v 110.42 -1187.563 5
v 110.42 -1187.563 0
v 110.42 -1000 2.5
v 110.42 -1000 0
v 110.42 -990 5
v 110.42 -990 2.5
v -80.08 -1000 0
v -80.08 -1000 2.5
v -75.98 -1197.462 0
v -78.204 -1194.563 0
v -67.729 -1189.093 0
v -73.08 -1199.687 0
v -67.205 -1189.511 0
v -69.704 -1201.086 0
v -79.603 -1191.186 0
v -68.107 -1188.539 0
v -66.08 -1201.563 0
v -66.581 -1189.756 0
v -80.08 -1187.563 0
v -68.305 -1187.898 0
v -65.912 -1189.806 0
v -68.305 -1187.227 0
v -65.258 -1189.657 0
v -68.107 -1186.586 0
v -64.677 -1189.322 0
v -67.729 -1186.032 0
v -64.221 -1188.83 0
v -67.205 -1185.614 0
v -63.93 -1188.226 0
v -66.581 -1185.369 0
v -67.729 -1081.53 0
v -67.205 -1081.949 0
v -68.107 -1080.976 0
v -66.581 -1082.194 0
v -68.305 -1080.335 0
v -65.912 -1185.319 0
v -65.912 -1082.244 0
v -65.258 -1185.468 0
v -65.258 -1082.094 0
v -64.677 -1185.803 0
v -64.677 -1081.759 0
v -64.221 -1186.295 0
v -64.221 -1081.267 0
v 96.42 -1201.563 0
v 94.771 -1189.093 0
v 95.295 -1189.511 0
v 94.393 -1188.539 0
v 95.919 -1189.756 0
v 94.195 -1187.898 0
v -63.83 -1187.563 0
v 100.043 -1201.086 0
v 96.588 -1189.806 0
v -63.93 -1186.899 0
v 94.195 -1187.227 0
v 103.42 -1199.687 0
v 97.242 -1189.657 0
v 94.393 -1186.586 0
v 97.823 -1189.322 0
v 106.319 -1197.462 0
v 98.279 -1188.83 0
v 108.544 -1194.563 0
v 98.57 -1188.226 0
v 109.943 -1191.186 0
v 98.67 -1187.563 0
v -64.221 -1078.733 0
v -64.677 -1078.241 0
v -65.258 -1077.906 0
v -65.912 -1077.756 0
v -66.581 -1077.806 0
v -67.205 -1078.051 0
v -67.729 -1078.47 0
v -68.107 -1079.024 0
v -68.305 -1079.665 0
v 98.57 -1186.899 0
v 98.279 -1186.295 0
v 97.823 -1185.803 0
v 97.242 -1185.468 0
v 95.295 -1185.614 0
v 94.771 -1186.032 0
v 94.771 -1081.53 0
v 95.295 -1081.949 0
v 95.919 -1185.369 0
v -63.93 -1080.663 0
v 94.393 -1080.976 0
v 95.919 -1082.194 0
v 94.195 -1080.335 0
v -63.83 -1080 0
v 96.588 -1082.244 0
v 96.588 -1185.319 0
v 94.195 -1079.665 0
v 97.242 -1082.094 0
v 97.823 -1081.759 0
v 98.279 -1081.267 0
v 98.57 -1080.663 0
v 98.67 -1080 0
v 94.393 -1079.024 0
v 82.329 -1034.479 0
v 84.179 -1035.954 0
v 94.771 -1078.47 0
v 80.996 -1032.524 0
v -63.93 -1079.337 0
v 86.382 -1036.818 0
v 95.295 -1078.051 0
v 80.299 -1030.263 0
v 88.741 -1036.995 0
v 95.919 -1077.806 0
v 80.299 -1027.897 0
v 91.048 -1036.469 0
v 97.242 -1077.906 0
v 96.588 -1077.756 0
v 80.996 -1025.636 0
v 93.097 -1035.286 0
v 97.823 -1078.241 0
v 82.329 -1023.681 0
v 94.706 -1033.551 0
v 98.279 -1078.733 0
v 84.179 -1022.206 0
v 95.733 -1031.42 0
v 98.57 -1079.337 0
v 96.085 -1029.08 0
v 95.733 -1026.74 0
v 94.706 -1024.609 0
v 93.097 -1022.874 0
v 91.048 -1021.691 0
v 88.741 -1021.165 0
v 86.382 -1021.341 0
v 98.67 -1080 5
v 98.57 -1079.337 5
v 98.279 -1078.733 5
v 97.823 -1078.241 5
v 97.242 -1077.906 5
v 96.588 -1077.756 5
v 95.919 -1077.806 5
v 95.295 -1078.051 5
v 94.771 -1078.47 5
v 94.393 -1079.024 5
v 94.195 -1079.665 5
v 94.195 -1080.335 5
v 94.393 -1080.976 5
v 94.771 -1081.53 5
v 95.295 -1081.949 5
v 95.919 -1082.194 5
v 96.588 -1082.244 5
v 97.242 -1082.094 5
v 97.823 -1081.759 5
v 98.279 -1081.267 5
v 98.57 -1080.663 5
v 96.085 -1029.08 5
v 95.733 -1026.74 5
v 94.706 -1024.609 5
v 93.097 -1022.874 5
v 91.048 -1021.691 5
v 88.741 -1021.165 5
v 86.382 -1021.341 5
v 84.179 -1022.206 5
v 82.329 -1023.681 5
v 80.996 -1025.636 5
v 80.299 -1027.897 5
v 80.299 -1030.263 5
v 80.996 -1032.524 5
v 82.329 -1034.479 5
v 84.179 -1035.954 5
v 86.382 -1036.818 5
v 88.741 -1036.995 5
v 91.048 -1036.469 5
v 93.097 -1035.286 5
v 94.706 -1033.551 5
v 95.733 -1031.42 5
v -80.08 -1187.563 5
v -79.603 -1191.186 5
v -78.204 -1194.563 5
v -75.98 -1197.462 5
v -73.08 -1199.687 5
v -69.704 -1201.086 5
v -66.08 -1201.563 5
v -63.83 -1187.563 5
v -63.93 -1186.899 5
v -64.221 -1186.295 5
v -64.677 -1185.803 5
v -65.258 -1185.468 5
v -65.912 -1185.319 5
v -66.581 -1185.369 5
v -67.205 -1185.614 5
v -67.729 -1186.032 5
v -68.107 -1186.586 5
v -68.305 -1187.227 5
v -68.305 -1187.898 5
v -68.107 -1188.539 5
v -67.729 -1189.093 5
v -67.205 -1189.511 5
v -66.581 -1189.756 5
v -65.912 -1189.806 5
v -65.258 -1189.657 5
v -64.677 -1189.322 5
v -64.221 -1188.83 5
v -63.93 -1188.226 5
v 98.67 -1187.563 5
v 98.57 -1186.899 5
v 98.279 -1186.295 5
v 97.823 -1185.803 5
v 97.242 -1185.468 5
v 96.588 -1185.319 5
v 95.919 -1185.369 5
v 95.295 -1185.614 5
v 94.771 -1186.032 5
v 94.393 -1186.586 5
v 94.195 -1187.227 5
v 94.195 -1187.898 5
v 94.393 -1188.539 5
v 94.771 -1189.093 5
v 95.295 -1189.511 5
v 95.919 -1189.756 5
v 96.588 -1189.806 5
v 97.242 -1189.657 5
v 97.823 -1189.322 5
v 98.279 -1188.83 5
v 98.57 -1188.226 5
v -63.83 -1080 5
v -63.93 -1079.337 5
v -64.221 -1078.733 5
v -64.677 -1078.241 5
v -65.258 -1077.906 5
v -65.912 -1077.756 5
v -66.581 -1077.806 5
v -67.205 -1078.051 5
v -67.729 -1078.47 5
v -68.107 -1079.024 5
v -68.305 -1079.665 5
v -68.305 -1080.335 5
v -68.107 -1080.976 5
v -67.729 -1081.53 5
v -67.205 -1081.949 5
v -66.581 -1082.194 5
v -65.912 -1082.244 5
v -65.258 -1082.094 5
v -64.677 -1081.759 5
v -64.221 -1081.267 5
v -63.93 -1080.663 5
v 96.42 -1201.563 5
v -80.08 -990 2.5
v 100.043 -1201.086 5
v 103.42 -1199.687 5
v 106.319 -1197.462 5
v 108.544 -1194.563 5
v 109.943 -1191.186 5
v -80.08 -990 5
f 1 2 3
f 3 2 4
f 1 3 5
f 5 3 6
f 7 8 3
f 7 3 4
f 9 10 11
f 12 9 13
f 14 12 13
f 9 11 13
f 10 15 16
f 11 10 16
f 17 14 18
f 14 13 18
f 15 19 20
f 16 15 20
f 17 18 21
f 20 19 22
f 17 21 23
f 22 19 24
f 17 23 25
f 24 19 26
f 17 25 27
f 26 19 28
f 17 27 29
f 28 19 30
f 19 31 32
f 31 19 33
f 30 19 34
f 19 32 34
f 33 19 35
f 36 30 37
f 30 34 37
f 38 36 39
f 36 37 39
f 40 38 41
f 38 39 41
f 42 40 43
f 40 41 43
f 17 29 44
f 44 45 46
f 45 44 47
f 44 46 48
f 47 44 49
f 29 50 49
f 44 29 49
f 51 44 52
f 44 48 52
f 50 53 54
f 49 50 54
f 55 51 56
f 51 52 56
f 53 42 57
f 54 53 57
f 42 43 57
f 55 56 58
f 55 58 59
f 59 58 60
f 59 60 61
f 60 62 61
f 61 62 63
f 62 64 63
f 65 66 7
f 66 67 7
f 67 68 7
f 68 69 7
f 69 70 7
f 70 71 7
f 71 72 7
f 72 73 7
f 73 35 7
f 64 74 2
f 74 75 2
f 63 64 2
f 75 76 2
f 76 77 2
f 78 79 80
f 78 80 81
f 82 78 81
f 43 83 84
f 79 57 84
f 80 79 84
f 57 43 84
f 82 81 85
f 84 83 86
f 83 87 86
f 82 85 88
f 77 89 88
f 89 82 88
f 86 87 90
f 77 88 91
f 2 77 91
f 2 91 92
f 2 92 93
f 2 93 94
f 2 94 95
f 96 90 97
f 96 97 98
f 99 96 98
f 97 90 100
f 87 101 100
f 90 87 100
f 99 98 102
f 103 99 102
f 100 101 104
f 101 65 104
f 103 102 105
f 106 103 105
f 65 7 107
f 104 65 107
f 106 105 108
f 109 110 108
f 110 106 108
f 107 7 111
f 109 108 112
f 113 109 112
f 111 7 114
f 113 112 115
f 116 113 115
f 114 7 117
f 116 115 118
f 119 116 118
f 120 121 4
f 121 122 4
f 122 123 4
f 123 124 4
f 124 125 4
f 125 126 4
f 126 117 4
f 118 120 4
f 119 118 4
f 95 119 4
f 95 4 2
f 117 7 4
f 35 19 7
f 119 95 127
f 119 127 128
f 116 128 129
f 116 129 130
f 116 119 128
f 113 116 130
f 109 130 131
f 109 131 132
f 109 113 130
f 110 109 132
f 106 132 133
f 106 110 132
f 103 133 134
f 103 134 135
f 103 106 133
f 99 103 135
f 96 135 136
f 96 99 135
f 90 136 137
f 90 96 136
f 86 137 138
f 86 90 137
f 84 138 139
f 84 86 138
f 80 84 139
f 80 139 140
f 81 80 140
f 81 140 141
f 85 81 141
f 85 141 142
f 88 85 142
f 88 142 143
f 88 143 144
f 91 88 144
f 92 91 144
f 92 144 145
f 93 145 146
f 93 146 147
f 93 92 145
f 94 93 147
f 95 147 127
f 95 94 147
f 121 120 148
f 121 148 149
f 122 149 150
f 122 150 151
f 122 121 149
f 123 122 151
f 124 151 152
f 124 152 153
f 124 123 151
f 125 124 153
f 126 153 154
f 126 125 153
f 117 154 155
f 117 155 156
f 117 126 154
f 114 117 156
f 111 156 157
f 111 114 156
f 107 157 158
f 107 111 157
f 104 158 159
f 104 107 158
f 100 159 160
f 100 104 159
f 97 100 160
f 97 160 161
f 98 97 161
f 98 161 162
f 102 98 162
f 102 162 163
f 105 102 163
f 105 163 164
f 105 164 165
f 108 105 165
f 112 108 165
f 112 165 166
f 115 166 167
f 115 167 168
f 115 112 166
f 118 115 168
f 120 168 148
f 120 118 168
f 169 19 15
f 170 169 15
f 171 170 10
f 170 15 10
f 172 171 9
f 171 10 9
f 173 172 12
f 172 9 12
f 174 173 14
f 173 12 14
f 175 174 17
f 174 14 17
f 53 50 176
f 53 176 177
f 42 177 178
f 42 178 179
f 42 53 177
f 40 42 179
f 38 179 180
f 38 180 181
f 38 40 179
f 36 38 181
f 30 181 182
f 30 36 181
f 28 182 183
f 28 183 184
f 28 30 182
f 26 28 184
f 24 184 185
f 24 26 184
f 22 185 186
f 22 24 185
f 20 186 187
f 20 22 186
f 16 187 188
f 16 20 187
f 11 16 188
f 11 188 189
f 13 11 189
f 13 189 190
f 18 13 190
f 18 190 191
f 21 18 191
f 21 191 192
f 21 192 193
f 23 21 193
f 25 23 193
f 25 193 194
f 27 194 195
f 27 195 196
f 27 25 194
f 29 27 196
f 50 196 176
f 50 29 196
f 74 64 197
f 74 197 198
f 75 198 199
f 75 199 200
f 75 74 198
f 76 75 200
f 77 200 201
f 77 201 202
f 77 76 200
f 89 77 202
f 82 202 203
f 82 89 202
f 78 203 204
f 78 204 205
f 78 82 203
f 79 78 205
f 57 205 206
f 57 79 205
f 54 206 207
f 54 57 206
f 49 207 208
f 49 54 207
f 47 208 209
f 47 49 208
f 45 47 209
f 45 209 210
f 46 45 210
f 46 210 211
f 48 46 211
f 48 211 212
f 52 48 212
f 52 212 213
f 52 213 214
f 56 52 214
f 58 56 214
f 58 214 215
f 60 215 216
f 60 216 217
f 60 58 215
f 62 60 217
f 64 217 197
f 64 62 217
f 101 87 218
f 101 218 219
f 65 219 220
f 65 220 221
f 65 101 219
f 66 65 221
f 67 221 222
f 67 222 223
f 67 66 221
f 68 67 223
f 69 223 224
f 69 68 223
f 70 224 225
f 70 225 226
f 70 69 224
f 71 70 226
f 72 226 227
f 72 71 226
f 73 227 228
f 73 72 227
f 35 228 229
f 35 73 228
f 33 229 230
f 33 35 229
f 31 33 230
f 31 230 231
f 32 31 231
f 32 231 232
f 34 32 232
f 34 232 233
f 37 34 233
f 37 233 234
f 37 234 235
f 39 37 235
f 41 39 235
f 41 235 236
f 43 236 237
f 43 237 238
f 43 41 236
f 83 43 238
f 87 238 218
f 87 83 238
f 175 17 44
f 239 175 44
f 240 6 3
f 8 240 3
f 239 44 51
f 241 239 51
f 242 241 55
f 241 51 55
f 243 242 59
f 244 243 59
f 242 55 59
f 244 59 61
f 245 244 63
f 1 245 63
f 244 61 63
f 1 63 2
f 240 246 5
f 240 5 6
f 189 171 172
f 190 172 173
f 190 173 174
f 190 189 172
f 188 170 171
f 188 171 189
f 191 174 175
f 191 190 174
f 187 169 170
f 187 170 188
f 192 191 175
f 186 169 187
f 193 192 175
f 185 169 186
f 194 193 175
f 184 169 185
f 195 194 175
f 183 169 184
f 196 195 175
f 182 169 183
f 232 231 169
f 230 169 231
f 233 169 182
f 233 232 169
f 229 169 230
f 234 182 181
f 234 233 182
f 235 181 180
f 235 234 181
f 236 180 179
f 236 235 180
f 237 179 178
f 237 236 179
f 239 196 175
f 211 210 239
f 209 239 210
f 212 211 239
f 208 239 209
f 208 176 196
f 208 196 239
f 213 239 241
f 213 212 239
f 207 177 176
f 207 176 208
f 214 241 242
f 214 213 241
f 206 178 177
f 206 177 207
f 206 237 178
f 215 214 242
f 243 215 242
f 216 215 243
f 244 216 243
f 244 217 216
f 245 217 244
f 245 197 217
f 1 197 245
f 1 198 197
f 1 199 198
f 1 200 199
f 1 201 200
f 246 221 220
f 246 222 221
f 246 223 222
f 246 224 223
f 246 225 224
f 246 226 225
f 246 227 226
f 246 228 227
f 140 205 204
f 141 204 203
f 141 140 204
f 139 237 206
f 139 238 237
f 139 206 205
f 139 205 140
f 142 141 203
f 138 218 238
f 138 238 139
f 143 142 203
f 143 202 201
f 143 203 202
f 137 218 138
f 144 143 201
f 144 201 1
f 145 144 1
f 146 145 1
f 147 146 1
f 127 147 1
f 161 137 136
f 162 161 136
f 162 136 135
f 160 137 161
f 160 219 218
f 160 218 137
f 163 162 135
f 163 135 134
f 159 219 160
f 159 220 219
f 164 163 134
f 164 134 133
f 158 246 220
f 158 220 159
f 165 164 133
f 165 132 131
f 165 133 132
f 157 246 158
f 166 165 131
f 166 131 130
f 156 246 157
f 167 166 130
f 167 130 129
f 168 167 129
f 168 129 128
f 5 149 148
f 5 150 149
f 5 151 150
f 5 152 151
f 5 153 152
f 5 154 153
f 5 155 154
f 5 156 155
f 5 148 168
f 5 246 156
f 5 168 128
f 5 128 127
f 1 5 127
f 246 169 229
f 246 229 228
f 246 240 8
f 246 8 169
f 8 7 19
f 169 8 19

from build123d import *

# Parameters (mm, degrees)
SKETCH4_R           = 2.25
SKETCH4_R_2         = 7.9375
BOSS_EXTRUDE1_DEPTH = 5
CUT_EXTRUDE1_DEPTH  = 191.5


with BuildPart() as part:
    # Sketch4 → Boss-Extrude1 (new body)
    with BuildSketch(Plane.XY):
        with BuildLine():
            Line((-66.080112923, -1201.56262), (96.419887077, -1201.56262))
            ThreePointArc((96.419887077, -1201.56262), (106.319382013, -1197.462114937), (110.419887077, -1187.56262))
            Line((110.419887077, -1187.56262), (110.419887077, -812.43738))
            ThreePointArc((110.419887077, -812.43738), (106.319382013, -802.537885063), (96.419887077, -798.43738))
            Line((96.419887077, -798.43738), (-66.080112923, -798.43738))
            ThreePointArc((-66.080112923, -798.43738), (-75.97960786, -802.537885063), (-80.080112923, -812.43738))
            Line((-80.080112923, -812.43738), (-80.080112923, -1187.56262))
            ThreePointArc((-80.080112923, -1187.56262), (-75.97960786, -1197.462114937), (-66.080112923, -1201.56262))
        make_face()
        with Locations((96.419887077, -1080)):
            Circle(SKETCH4_R, mode=Mode.SUBTRACT)
        with Locations((88.147808187, -1029.0799835)):
            Circle(SKETCH4_R_2, mode=Mode.SUBTRACT)
        with Locations((-66.080112923, -1080)):
            Circle(SKETCH4_R, mode=Mode.SUBTRACT)
        with Locations((96.419887077, -920)):
            Circle(SKETCH4_R, mode=Mode.SUBTRACT)
        with Locations((-66.080112923, -920)):
            Circle(SKETCH4_R, mode=Mode.SUBTRACT)
        with Locations((-66.080112923, -1187.56262)):
            Circle(SKETCH4_R, mode=Mode.SUBTRACT)
        with Locations((96.419887077, -1187.56262)):
            Circle(SKETCH4_R, mode=Mode.SUBTRACT)
        with Locations((-66.080112923, -812.43738)):
            Circle(SKETCH4_R, mode=Mode.SUBTRACT)
        with Locations((96.419887077, -812.43738)):
            Circle(SKETCH4_R, mode=Mode.SUBTRACT)
    extrude(amount=BOSS_EXTRUDE1_DEPTH)

    # Sketch6 → Cut-Extrude1 (cut, through all)
    with BuildSketch(Plane(origin=(110.419887077, 0, 0), x_dir=(0, 0, -1), z_dir=(1, 0, 0))):
        Polygon((-5, -990), (-2.5, -990), (-2.5, -1000), (0, -1000), (102.688211321, -812.43738), (-56.641520251, -690.463913443), (-113.62806658, -898.225606144), align=None)
    extrude(amount=-CUT_EXTRUDE1_DEPTH, mode=Mode.SUBTRACT)


solid = part.part
